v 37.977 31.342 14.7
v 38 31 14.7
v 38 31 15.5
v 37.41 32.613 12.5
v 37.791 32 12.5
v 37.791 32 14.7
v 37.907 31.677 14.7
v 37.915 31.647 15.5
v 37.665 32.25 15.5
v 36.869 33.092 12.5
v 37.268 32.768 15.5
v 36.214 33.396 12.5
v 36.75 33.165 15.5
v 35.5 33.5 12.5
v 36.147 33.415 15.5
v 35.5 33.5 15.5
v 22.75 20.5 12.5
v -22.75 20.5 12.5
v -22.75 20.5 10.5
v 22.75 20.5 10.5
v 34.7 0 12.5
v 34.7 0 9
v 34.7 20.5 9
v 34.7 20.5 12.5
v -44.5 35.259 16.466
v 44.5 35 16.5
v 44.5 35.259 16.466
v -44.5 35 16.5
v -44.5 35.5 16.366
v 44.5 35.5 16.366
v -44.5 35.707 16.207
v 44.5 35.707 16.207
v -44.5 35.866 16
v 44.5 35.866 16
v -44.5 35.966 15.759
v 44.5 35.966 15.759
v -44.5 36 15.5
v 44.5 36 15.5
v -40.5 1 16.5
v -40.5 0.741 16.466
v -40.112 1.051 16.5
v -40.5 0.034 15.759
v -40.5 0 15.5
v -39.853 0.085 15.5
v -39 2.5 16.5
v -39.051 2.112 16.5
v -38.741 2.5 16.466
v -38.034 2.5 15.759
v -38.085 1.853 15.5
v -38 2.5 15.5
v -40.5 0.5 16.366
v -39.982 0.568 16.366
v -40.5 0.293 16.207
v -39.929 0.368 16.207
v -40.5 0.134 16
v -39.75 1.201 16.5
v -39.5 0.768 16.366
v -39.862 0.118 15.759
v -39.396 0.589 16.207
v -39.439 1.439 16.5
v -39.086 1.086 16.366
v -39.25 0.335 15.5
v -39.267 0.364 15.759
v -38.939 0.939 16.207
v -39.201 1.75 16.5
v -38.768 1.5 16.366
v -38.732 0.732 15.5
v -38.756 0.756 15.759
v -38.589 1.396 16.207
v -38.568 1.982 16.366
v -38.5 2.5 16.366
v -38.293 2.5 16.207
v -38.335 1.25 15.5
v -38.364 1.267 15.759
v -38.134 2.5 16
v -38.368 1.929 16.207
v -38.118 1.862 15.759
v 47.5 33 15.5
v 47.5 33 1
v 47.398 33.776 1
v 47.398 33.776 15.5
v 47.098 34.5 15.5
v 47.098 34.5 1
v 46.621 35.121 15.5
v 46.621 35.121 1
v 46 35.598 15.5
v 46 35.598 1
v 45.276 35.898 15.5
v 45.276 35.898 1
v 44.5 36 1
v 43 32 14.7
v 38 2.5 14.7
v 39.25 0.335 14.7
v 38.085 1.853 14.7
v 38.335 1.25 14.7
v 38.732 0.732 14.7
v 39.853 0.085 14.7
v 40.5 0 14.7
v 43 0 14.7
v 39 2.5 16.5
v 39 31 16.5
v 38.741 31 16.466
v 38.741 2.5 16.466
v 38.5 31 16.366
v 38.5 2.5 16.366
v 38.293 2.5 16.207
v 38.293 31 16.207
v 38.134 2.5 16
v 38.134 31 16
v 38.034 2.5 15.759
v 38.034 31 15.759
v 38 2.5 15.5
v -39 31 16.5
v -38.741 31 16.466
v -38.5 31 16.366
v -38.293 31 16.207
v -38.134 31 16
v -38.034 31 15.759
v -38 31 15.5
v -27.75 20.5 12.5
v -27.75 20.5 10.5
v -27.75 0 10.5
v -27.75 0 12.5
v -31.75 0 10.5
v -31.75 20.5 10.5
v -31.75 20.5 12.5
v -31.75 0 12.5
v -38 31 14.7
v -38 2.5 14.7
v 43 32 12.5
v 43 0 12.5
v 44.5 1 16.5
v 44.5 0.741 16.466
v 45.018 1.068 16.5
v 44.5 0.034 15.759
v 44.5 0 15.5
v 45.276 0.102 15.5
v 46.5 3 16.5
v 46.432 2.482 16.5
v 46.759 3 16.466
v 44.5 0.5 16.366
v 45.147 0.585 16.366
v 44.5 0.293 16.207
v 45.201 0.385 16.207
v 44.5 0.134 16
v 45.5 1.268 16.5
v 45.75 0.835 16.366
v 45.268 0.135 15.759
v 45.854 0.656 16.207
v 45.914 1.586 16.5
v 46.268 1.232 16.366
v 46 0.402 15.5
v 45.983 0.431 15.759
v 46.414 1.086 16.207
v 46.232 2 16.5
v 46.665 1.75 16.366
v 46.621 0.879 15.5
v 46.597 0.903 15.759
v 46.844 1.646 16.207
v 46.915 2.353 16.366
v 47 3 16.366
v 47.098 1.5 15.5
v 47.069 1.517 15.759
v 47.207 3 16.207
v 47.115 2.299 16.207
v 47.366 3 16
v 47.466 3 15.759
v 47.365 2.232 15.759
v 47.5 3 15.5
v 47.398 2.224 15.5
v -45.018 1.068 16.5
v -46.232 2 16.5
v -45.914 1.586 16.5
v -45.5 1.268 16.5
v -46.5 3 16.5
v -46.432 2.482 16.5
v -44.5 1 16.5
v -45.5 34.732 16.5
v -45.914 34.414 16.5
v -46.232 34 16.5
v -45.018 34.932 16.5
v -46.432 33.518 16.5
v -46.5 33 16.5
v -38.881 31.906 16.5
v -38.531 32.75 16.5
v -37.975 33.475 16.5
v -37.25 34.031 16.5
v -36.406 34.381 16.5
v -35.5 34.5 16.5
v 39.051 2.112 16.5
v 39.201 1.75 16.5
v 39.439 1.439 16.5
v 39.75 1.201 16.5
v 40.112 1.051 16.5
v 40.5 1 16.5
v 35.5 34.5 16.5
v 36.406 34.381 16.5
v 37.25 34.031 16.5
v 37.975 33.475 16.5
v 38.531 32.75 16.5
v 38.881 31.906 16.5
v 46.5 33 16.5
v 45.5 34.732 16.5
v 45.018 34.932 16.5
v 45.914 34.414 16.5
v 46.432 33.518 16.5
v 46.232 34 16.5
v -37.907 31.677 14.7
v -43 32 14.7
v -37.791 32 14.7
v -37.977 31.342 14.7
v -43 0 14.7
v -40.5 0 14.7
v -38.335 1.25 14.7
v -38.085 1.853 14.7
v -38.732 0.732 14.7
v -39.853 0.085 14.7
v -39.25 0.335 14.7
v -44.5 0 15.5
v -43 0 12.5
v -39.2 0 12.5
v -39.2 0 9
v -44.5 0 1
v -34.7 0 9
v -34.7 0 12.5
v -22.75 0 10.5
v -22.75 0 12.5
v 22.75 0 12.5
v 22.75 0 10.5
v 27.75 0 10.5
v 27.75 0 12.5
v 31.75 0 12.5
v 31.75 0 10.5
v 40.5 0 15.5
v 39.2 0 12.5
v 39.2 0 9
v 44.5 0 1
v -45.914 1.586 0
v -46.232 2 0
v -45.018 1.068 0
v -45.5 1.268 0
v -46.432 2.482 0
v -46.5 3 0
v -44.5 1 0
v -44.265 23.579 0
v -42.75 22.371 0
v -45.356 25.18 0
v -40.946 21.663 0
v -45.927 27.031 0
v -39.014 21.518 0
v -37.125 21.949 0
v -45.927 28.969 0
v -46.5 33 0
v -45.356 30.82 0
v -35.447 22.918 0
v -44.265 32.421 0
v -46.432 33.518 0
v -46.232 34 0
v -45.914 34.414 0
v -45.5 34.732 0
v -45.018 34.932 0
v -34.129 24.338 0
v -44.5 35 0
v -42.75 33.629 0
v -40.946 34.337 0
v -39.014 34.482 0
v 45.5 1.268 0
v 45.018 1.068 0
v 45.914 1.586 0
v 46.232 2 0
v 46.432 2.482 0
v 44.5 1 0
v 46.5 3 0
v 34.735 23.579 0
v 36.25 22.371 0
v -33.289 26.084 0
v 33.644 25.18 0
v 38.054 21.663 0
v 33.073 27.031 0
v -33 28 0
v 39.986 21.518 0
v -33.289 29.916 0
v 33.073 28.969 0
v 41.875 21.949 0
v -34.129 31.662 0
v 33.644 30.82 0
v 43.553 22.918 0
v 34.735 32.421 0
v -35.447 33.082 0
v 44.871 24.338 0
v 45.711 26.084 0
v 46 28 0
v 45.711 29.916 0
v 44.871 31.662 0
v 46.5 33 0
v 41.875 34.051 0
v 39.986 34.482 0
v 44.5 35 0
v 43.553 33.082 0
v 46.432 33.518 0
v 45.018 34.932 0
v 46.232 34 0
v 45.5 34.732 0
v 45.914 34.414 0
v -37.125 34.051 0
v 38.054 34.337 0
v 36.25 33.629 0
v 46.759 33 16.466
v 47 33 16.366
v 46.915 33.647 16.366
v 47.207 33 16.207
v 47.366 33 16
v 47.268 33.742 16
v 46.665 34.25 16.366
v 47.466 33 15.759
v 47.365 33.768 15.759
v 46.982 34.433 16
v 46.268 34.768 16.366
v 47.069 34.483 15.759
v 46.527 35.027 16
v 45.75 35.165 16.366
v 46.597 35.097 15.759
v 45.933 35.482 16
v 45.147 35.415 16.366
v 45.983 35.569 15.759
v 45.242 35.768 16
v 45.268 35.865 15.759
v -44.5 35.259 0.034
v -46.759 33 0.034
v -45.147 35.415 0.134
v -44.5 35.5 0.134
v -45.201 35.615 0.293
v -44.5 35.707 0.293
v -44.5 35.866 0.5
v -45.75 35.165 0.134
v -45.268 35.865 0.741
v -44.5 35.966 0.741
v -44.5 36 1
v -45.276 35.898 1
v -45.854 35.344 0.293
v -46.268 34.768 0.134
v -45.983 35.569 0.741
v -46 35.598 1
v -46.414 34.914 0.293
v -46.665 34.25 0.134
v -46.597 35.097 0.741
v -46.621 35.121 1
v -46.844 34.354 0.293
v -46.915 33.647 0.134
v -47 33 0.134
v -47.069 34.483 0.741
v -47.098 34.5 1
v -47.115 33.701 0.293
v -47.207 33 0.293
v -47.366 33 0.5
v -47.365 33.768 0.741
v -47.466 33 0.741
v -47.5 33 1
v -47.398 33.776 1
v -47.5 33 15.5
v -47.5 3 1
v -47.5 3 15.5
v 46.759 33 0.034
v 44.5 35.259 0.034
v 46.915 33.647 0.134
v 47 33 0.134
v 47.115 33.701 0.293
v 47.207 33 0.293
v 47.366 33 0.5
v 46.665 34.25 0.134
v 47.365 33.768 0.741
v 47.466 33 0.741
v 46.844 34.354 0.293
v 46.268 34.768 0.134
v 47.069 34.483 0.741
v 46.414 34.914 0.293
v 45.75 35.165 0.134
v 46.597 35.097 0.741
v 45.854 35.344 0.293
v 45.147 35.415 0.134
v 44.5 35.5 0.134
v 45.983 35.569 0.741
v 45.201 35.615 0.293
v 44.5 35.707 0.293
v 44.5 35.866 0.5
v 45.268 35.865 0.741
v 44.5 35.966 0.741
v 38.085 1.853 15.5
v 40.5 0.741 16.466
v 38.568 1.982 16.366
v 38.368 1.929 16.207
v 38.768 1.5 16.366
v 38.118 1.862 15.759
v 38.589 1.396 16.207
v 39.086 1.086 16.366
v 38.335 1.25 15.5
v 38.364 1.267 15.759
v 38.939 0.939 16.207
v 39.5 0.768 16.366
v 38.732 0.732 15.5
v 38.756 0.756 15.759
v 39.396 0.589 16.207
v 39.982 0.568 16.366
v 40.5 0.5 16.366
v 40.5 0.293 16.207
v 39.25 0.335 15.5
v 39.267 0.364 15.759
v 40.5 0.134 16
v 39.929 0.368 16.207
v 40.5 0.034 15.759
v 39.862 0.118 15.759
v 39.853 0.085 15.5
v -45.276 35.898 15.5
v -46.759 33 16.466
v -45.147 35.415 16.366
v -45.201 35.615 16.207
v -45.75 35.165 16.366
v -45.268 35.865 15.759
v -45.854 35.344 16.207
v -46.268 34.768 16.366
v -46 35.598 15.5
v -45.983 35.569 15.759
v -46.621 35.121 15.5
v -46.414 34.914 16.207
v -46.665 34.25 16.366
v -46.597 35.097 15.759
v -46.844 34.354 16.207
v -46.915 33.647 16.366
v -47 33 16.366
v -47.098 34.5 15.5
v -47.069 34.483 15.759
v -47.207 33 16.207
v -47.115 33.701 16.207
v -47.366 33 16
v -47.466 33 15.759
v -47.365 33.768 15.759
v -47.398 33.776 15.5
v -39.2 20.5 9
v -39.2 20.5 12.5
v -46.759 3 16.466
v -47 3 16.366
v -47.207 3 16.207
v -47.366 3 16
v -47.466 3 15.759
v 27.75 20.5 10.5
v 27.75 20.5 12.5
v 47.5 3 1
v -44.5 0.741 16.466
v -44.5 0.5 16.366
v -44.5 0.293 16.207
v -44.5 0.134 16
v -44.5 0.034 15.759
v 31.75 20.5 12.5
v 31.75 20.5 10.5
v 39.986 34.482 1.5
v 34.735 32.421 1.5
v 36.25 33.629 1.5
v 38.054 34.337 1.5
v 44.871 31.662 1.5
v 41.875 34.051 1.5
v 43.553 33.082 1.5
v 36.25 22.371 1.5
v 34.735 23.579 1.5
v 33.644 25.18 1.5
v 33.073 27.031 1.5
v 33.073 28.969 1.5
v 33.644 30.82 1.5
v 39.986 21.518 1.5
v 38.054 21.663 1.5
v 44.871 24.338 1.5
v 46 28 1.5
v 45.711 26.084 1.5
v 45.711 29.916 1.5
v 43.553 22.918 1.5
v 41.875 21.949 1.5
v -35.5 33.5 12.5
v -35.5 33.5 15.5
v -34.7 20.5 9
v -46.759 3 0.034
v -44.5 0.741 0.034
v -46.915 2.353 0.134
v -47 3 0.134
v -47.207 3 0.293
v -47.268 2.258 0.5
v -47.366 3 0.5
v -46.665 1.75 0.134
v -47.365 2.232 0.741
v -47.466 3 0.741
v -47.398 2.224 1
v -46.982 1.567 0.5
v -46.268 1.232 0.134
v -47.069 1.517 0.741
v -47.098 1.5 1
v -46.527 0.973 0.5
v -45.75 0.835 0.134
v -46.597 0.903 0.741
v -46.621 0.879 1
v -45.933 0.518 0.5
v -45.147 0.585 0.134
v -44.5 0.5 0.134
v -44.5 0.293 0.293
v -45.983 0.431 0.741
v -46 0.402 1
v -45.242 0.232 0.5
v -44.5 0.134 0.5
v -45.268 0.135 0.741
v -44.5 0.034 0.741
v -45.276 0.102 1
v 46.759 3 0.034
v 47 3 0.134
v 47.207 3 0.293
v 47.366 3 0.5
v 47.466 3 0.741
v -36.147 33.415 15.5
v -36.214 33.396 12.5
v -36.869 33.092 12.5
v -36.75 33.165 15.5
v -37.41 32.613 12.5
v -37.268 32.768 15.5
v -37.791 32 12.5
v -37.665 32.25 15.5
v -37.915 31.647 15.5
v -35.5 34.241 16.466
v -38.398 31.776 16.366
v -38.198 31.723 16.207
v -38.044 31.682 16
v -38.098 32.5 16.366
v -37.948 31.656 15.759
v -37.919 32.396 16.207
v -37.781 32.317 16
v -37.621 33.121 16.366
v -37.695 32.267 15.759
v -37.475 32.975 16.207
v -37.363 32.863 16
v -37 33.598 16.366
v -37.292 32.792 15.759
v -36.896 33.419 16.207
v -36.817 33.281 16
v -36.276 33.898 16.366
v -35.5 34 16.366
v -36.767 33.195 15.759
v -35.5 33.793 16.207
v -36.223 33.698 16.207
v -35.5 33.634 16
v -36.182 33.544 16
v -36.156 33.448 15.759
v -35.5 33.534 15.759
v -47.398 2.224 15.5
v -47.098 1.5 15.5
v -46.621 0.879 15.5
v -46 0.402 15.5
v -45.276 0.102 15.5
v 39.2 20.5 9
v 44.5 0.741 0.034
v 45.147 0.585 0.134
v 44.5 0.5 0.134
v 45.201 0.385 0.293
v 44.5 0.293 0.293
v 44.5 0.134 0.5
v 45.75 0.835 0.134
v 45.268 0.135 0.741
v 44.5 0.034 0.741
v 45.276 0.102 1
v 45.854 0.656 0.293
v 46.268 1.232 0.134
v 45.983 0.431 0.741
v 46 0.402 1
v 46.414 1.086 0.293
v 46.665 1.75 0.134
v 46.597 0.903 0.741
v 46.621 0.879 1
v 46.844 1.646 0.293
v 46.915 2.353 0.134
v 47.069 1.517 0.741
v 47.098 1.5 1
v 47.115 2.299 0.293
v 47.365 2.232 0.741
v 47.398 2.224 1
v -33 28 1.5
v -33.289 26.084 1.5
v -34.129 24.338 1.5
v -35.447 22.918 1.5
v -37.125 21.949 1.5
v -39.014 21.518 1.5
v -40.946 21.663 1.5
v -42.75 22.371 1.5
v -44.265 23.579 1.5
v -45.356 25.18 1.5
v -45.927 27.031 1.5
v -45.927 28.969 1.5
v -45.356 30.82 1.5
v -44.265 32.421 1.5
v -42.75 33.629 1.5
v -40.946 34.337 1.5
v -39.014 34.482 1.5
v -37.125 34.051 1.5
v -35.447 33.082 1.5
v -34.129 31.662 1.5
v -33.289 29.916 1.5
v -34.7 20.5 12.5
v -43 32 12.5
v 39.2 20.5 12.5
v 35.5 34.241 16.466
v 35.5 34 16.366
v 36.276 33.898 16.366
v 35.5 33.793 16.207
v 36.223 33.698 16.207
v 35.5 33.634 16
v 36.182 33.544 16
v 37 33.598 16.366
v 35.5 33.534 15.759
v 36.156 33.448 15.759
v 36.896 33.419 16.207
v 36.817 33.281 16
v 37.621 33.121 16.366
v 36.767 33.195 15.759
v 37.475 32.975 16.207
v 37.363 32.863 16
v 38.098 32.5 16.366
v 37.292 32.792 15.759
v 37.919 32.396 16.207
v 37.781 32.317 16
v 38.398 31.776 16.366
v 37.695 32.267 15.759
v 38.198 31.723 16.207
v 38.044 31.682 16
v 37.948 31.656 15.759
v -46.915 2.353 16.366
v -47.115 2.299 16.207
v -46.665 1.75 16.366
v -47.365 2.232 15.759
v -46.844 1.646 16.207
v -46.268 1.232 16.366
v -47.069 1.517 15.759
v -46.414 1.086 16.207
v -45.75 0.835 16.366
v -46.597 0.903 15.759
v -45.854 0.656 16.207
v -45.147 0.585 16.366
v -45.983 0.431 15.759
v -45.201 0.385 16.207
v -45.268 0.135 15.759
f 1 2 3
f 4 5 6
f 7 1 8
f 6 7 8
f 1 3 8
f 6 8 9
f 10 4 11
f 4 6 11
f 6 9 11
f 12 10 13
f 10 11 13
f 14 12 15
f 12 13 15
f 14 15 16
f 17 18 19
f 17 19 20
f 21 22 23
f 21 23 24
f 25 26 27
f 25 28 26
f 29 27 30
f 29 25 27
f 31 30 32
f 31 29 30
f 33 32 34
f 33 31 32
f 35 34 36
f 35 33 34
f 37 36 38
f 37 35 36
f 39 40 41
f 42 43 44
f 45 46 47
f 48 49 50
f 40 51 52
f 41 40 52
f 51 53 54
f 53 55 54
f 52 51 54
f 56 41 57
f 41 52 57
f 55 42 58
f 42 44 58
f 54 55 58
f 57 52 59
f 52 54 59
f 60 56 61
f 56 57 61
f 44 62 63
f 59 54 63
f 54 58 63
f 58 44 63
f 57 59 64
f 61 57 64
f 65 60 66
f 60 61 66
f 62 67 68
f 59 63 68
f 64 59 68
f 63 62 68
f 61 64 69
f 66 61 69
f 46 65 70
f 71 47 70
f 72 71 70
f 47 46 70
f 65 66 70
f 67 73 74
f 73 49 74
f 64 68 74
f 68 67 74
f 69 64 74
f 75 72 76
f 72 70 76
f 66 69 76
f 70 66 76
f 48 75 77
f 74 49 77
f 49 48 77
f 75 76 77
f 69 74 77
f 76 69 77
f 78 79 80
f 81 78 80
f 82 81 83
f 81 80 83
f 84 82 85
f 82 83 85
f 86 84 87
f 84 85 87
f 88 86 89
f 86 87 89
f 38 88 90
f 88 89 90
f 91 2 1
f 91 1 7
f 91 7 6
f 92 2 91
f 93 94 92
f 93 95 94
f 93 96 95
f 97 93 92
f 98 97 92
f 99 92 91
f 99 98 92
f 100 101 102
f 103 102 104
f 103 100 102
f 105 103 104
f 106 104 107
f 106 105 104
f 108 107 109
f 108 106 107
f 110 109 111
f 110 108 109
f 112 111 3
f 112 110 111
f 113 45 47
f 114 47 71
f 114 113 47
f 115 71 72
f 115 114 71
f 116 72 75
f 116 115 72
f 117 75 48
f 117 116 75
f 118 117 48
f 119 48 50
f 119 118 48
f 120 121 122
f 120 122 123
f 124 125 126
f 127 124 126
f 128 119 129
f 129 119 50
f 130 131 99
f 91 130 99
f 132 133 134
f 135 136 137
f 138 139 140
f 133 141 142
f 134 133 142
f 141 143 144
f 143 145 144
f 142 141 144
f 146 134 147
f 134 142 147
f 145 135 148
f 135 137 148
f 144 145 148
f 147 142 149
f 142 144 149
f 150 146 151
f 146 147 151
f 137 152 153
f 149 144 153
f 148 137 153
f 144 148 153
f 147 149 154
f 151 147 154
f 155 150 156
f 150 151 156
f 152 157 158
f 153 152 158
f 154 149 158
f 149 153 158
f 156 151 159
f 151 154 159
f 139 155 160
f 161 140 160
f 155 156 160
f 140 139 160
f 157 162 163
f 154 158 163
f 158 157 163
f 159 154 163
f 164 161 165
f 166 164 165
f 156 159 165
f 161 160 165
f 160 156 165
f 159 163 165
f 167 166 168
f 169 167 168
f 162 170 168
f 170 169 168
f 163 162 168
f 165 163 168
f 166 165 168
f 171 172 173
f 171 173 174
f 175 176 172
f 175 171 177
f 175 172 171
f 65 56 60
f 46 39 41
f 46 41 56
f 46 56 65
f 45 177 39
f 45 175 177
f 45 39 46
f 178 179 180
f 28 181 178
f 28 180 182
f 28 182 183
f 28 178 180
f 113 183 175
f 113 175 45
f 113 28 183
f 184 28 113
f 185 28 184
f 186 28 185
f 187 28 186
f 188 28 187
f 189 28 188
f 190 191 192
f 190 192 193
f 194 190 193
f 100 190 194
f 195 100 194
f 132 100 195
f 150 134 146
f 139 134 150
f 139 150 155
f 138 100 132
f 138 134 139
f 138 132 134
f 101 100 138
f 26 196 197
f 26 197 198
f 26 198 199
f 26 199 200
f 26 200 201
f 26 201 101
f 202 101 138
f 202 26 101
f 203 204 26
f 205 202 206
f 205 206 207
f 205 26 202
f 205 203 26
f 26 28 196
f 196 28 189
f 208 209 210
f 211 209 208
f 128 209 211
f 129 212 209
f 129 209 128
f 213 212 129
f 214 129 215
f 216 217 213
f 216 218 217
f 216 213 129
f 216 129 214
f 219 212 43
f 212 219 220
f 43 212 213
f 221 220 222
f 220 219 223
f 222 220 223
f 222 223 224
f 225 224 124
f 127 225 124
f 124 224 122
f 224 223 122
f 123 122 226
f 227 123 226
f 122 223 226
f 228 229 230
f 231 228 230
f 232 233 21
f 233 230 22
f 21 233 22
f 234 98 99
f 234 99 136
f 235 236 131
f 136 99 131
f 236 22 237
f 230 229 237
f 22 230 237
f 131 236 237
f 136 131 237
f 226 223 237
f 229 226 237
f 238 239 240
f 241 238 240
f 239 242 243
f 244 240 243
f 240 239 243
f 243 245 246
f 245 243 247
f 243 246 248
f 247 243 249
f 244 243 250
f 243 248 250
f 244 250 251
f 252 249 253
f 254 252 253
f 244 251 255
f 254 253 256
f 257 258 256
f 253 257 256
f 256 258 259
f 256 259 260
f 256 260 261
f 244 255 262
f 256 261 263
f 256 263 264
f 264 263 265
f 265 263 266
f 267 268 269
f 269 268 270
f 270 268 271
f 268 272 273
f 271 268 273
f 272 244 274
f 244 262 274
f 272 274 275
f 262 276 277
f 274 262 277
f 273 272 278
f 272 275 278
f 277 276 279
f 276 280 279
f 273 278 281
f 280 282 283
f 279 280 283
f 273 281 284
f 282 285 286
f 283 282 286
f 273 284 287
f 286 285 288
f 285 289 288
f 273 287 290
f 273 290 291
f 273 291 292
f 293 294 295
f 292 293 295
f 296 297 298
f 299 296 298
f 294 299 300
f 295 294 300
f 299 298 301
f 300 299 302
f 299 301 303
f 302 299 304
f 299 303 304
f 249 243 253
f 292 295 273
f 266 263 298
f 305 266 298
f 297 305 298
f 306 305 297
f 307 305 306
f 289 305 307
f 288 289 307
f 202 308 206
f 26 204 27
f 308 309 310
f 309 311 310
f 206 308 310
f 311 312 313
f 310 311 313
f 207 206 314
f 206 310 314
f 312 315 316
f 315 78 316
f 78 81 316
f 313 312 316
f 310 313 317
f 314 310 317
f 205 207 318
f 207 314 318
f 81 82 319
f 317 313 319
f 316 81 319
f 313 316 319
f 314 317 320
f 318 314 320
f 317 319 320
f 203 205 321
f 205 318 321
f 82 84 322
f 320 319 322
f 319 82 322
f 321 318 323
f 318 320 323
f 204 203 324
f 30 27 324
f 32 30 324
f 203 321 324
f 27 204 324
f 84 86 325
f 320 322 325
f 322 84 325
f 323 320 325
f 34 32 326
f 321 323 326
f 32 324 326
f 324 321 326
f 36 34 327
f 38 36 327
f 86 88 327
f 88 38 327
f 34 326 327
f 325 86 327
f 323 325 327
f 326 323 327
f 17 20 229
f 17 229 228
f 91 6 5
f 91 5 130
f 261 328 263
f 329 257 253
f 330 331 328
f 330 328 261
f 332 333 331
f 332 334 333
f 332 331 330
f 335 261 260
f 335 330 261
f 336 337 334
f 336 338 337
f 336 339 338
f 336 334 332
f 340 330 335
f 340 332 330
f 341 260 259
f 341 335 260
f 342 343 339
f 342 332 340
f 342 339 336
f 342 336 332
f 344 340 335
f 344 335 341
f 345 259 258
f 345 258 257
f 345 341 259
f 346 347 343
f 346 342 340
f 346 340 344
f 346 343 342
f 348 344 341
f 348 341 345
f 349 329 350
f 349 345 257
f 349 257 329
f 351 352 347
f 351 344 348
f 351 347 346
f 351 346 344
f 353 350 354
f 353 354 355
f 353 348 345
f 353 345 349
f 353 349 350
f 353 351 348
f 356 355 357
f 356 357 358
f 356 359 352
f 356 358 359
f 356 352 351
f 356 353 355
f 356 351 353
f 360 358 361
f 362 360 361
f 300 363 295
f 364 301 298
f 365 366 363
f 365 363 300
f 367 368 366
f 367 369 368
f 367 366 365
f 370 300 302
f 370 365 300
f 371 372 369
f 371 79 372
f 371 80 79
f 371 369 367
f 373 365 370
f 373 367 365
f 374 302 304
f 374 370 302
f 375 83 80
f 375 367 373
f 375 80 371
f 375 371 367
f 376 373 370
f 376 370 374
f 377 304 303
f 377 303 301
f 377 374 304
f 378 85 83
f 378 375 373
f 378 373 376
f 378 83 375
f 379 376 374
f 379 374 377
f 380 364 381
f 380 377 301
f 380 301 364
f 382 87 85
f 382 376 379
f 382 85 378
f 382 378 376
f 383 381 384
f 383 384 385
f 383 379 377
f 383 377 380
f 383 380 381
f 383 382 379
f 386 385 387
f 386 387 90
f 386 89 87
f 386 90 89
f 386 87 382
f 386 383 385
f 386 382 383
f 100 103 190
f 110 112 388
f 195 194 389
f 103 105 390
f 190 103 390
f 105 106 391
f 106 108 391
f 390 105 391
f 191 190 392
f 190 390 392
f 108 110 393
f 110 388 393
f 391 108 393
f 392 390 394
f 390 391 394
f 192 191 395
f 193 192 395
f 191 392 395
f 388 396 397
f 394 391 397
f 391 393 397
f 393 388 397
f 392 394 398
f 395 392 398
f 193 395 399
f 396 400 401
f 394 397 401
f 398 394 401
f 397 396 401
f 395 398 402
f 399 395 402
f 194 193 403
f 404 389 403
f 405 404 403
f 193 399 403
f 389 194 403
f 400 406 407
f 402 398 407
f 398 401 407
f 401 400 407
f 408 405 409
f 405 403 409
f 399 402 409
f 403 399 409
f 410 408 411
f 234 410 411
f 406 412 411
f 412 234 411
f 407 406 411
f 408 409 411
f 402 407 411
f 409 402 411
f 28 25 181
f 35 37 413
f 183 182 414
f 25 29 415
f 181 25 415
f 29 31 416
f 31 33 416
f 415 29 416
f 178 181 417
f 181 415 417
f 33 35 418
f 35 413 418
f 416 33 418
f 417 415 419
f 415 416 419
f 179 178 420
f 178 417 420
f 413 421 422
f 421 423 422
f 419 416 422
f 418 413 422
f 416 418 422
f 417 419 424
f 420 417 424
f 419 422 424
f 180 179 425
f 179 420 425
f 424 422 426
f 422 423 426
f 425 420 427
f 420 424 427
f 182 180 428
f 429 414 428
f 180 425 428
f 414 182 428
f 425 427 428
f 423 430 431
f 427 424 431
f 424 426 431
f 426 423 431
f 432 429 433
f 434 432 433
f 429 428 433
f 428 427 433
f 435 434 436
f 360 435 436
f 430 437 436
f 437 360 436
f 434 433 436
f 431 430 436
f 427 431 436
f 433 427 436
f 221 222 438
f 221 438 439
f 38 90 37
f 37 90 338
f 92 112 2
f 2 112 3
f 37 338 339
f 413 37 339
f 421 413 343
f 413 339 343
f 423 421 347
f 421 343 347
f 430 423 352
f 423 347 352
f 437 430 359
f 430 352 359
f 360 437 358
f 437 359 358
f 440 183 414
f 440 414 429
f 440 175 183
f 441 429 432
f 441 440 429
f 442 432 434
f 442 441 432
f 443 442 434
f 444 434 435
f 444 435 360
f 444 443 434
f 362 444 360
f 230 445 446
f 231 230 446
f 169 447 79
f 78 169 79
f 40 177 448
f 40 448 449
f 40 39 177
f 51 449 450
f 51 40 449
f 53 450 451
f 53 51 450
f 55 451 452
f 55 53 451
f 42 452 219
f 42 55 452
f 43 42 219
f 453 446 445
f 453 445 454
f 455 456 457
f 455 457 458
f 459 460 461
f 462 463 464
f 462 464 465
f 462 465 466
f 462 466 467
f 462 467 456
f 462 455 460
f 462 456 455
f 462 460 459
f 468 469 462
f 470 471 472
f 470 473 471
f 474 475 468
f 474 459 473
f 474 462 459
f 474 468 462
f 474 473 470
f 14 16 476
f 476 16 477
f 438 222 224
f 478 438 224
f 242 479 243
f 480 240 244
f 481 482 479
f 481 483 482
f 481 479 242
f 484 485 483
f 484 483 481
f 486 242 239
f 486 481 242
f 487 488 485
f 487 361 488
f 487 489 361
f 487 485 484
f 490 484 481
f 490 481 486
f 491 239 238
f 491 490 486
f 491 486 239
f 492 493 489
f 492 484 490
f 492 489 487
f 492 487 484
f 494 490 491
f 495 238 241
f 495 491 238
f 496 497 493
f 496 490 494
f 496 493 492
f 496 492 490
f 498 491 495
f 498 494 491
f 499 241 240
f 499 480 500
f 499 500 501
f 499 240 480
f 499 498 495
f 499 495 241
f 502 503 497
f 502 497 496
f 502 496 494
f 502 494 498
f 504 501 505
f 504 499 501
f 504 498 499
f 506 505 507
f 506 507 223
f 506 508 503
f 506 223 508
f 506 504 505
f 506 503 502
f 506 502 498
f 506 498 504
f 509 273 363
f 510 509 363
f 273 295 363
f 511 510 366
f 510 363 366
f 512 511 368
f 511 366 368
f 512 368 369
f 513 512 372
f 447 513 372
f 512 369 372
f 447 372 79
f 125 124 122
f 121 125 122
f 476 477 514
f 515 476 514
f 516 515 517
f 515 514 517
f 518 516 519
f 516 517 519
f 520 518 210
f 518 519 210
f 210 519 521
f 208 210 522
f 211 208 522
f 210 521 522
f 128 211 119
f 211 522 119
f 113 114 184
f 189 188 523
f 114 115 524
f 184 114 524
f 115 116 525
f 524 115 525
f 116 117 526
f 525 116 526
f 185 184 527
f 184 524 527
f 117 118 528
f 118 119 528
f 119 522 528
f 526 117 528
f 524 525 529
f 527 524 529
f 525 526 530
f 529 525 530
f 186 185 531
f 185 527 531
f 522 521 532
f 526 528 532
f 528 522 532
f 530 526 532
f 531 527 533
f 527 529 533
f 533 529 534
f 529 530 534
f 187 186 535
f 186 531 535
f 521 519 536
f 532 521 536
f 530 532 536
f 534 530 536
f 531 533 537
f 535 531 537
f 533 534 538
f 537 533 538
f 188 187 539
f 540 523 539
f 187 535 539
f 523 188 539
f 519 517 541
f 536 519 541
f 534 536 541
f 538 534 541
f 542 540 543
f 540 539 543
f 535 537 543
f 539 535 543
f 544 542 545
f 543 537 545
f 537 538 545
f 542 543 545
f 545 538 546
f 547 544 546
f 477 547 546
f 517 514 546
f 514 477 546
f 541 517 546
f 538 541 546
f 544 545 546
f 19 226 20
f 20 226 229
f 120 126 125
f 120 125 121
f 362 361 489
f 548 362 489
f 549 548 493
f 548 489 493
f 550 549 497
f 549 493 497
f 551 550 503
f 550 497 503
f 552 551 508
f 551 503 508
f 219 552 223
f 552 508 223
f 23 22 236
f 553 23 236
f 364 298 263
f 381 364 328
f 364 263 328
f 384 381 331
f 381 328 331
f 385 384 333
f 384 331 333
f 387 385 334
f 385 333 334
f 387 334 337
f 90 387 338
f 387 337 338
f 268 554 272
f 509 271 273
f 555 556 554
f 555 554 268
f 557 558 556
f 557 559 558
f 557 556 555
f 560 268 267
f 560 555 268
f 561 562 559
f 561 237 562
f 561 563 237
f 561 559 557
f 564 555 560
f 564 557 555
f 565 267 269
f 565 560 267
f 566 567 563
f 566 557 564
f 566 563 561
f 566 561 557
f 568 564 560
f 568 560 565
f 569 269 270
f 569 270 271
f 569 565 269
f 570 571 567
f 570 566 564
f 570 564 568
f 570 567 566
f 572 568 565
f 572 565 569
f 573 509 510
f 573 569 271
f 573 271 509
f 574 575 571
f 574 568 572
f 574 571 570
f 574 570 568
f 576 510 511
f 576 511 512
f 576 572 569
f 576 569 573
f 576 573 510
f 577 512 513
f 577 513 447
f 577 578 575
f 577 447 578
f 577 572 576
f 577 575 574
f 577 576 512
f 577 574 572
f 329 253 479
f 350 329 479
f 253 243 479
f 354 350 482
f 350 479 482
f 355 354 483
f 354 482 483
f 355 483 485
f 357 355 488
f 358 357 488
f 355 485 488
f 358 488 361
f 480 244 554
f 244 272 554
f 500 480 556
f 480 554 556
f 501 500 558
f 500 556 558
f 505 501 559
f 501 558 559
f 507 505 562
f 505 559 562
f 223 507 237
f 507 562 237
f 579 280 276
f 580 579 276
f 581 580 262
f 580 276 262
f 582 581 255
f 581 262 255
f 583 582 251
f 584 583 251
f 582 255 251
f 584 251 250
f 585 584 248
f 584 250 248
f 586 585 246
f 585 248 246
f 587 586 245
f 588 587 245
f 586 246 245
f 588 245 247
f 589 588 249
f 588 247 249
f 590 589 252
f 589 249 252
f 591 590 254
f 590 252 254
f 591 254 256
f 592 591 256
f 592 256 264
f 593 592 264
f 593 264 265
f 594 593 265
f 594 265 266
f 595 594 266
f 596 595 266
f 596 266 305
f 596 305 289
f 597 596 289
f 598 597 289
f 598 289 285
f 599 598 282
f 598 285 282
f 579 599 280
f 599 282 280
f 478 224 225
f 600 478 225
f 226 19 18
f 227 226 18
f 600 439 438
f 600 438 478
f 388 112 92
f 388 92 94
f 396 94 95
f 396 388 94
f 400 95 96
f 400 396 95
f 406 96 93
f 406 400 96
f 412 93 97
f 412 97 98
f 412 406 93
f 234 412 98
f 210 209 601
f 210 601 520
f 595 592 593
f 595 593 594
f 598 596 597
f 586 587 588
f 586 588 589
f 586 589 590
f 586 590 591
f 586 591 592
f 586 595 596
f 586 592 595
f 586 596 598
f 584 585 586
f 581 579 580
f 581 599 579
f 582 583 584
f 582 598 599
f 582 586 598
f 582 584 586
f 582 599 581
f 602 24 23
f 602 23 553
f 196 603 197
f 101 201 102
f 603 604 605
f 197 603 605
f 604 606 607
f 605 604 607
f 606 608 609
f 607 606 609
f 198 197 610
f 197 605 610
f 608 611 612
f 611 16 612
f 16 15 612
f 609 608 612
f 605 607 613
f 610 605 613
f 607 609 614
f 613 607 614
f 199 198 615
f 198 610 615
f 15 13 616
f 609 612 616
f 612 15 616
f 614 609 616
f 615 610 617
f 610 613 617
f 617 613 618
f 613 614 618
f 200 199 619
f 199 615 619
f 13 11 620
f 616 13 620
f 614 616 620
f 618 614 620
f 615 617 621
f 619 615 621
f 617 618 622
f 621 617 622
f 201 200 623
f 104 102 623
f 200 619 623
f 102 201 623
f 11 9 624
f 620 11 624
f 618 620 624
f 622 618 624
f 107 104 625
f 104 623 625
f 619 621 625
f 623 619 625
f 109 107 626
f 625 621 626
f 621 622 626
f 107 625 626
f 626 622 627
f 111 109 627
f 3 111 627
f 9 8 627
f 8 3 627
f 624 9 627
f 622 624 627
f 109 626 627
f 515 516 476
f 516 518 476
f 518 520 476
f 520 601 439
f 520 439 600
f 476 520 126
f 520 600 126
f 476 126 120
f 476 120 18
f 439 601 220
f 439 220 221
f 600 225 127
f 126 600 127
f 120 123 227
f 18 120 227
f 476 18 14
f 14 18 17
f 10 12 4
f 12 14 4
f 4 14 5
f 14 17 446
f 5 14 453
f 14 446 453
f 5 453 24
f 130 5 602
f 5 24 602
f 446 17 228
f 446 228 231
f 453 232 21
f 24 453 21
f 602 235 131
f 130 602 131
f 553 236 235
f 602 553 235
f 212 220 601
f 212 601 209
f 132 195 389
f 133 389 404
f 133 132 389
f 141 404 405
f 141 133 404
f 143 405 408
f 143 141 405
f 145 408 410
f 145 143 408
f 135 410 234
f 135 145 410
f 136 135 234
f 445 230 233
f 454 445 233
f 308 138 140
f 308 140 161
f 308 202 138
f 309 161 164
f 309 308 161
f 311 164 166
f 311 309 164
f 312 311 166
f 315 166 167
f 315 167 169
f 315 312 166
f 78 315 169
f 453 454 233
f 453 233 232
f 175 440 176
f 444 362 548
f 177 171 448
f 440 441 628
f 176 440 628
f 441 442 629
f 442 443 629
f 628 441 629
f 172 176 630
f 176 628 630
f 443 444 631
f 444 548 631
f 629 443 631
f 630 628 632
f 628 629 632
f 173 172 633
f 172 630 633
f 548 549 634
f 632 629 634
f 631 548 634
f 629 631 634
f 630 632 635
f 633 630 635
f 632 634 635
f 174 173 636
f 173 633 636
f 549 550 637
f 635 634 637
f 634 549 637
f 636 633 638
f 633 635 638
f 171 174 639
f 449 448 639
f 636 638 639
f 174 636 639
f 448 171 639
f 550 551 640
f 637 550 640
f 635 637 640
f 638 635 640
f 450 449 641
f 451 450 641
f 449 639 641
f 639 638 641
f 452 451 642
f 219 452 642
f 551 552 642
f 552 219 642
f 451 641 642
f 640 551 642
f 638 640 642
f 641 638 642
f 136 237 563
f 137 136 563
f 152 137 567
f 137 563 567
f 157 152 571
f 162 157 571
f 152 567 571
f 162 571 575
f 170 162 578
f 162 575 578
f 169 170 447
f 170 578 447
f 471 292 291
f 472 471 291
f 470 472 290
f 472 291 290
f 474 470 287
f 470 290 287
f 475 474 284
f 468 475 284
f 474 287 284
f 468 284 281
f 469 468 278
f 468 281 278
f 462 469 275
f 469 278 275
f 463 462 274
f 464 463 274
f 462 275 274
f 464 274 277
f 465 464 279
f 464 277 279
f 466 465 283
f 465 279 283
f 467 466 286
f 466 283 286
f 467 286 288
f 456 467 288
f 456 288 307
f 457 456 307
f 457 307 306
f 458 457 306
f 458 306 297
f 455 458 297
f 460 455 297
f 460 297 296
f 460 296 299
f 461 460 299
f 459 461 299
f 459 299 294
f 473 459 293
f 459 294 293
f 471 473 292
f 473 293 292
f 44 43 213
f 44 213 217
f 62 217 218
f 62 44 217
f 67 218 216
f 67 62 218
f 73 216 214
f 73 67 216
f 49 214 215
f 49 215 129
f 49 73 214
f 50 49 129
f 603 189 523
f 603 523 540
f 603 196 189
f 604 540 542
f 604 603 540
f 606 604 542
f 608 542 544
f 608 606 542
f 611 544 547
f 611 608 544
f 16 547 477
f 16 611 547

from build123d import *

# Parameters (mm, degrees)
PAD_DEPTH       = 16.5
SKETCH001_R     = 6.5
POCKET_DEPTH    = 1.5
SKETCH002_W     = 86
SKETCH002_H     = 2.2
POCKET001_DEPTH = 32
POCKET002_DEPTH = 4
SKETCH004_W     = 4
SKETCH004_H     = 2
SKETCH004_W_2   = 4.5
SKETCH004_H_2   = 3.5
SKETCH004_W_3   = 45.5
POCKET003_DEPTH = 20.5
FILLET_R        = 1


with BuildPart() as part:
    # Sketch → Pad (new body)
    with BuildSketch(Plane.XY):
        with BuildLine():
            Line((-47.5, 33), (-47.5, 3))
            ThreePointArc((-47.5, 3), (-46.62132, 0.87868), (-44.5, 0))
            Line((-44.5, 0), (44.5, 0))
            ThreePointArc((44.5, 0), (46.62132, 0.87868), (47.5, 3))
            Line((47.5, 3), (47.5, 33))
            ThreePointArc((47.5, 33), (46.62132, 35.12132), (44.5, 36))
            Line((44.5, 36), (-44.5, 36))
            ThreePointArc((-44.5, 36), (-46.62132, 35.12132), (-47.5, 33))
        make_face()
    extrude(amount=PAD_DEPTH)

    # Sketch001 (on Face9 of Pad) → Pocket (cut)
    with BuildSketch(Plane(origin=(0, 0, 0), x_dir=(1, 0, 0), z_dir=(0, 0, -1))):
        with Locations((-39.5, -28)):
            Circle(SKETCH001_R)
        with Locations((39.5, -28)):
            Circle(SKETCH001_R)
    extrude(amount=-POCKET_DEPTH, mode=Mode.SUBTRACT)

    # Sketch002 (on Face7 of Pocket) → Pocket001 (cut)
    with BuildSketch(Plane.XZ):
        with Locations((0, 13.6)):
            Rectangle(SKETCH002_W, SKETCH002_H)
    extrude(amount=-POCKET001_DEPTH, mode=Mode.SUBTRACT)

    # Sketch003 (on Face5 of Pocket001) → Pocket002 (cut)
    with BuildSketch(Plane.XY.offset(16.5)):
        with BuildLine():
            Line((-40.5, 0), (40.5, 0))
            ThreePointArc((38, 2.5), (38.732233, 0.732233), (40.5, 0))
            Line((38, 2.5), (38, 31))
            ThreePointArc((38, 31), (37.267767, 32.767767), (35.5, 33.5))
            Line((35.5, 33.5), (-35.5, 33.5))
            ThreePointArc((-35.5, 33.5), (-37.267767, 32.767767), (-38, 31))
            Line((-38, 31), (-38, 2.5))
            ThreePointArc((-40.5, 0), (-38.732233, 0.732233), (-38, 2.5))
        make_face()
    extrude(amount=-POCKET002_DEPTH, mode=Mode.SUBTRACT)

    # Sketch004 (on Face7 of Pocket002) → Pocket003 (cut)
    with BuildSketch(Plane.XZ):
        with Locations((-29.75, 11.5)):
            Rectangle(SKETCH004_W, SKETCH004_H)
        with Locations((29.75, 11.5)):
            Rectangle(SKETCH004_W, SKETCH004_H)
        with Locations((-36.95, 10.75)):
            Rectangle(SKETCH004_W_2, SKETCH004_H_2)
        with Locations((36.95, 10.75)):
            Rectangle(SKETCH004_W_2, SKETCH004_H_2)
        with Locations((0, 11.5)):
            Rectangle(SKETCH004_W_3, SKETCH004_H)
    extrude(amount=-POCKET003_DEPTH, mode=Mode.SUBTRACT)

    # Fillet
    fillet_edges = [part.edges().sort_by_distance(p)[0] for p in [
        (0, 0, 0),
        (0, 36, 16.5),
    ]]
    fillet(fillet_edges, radius=FILLET_R)


solid = part.part
